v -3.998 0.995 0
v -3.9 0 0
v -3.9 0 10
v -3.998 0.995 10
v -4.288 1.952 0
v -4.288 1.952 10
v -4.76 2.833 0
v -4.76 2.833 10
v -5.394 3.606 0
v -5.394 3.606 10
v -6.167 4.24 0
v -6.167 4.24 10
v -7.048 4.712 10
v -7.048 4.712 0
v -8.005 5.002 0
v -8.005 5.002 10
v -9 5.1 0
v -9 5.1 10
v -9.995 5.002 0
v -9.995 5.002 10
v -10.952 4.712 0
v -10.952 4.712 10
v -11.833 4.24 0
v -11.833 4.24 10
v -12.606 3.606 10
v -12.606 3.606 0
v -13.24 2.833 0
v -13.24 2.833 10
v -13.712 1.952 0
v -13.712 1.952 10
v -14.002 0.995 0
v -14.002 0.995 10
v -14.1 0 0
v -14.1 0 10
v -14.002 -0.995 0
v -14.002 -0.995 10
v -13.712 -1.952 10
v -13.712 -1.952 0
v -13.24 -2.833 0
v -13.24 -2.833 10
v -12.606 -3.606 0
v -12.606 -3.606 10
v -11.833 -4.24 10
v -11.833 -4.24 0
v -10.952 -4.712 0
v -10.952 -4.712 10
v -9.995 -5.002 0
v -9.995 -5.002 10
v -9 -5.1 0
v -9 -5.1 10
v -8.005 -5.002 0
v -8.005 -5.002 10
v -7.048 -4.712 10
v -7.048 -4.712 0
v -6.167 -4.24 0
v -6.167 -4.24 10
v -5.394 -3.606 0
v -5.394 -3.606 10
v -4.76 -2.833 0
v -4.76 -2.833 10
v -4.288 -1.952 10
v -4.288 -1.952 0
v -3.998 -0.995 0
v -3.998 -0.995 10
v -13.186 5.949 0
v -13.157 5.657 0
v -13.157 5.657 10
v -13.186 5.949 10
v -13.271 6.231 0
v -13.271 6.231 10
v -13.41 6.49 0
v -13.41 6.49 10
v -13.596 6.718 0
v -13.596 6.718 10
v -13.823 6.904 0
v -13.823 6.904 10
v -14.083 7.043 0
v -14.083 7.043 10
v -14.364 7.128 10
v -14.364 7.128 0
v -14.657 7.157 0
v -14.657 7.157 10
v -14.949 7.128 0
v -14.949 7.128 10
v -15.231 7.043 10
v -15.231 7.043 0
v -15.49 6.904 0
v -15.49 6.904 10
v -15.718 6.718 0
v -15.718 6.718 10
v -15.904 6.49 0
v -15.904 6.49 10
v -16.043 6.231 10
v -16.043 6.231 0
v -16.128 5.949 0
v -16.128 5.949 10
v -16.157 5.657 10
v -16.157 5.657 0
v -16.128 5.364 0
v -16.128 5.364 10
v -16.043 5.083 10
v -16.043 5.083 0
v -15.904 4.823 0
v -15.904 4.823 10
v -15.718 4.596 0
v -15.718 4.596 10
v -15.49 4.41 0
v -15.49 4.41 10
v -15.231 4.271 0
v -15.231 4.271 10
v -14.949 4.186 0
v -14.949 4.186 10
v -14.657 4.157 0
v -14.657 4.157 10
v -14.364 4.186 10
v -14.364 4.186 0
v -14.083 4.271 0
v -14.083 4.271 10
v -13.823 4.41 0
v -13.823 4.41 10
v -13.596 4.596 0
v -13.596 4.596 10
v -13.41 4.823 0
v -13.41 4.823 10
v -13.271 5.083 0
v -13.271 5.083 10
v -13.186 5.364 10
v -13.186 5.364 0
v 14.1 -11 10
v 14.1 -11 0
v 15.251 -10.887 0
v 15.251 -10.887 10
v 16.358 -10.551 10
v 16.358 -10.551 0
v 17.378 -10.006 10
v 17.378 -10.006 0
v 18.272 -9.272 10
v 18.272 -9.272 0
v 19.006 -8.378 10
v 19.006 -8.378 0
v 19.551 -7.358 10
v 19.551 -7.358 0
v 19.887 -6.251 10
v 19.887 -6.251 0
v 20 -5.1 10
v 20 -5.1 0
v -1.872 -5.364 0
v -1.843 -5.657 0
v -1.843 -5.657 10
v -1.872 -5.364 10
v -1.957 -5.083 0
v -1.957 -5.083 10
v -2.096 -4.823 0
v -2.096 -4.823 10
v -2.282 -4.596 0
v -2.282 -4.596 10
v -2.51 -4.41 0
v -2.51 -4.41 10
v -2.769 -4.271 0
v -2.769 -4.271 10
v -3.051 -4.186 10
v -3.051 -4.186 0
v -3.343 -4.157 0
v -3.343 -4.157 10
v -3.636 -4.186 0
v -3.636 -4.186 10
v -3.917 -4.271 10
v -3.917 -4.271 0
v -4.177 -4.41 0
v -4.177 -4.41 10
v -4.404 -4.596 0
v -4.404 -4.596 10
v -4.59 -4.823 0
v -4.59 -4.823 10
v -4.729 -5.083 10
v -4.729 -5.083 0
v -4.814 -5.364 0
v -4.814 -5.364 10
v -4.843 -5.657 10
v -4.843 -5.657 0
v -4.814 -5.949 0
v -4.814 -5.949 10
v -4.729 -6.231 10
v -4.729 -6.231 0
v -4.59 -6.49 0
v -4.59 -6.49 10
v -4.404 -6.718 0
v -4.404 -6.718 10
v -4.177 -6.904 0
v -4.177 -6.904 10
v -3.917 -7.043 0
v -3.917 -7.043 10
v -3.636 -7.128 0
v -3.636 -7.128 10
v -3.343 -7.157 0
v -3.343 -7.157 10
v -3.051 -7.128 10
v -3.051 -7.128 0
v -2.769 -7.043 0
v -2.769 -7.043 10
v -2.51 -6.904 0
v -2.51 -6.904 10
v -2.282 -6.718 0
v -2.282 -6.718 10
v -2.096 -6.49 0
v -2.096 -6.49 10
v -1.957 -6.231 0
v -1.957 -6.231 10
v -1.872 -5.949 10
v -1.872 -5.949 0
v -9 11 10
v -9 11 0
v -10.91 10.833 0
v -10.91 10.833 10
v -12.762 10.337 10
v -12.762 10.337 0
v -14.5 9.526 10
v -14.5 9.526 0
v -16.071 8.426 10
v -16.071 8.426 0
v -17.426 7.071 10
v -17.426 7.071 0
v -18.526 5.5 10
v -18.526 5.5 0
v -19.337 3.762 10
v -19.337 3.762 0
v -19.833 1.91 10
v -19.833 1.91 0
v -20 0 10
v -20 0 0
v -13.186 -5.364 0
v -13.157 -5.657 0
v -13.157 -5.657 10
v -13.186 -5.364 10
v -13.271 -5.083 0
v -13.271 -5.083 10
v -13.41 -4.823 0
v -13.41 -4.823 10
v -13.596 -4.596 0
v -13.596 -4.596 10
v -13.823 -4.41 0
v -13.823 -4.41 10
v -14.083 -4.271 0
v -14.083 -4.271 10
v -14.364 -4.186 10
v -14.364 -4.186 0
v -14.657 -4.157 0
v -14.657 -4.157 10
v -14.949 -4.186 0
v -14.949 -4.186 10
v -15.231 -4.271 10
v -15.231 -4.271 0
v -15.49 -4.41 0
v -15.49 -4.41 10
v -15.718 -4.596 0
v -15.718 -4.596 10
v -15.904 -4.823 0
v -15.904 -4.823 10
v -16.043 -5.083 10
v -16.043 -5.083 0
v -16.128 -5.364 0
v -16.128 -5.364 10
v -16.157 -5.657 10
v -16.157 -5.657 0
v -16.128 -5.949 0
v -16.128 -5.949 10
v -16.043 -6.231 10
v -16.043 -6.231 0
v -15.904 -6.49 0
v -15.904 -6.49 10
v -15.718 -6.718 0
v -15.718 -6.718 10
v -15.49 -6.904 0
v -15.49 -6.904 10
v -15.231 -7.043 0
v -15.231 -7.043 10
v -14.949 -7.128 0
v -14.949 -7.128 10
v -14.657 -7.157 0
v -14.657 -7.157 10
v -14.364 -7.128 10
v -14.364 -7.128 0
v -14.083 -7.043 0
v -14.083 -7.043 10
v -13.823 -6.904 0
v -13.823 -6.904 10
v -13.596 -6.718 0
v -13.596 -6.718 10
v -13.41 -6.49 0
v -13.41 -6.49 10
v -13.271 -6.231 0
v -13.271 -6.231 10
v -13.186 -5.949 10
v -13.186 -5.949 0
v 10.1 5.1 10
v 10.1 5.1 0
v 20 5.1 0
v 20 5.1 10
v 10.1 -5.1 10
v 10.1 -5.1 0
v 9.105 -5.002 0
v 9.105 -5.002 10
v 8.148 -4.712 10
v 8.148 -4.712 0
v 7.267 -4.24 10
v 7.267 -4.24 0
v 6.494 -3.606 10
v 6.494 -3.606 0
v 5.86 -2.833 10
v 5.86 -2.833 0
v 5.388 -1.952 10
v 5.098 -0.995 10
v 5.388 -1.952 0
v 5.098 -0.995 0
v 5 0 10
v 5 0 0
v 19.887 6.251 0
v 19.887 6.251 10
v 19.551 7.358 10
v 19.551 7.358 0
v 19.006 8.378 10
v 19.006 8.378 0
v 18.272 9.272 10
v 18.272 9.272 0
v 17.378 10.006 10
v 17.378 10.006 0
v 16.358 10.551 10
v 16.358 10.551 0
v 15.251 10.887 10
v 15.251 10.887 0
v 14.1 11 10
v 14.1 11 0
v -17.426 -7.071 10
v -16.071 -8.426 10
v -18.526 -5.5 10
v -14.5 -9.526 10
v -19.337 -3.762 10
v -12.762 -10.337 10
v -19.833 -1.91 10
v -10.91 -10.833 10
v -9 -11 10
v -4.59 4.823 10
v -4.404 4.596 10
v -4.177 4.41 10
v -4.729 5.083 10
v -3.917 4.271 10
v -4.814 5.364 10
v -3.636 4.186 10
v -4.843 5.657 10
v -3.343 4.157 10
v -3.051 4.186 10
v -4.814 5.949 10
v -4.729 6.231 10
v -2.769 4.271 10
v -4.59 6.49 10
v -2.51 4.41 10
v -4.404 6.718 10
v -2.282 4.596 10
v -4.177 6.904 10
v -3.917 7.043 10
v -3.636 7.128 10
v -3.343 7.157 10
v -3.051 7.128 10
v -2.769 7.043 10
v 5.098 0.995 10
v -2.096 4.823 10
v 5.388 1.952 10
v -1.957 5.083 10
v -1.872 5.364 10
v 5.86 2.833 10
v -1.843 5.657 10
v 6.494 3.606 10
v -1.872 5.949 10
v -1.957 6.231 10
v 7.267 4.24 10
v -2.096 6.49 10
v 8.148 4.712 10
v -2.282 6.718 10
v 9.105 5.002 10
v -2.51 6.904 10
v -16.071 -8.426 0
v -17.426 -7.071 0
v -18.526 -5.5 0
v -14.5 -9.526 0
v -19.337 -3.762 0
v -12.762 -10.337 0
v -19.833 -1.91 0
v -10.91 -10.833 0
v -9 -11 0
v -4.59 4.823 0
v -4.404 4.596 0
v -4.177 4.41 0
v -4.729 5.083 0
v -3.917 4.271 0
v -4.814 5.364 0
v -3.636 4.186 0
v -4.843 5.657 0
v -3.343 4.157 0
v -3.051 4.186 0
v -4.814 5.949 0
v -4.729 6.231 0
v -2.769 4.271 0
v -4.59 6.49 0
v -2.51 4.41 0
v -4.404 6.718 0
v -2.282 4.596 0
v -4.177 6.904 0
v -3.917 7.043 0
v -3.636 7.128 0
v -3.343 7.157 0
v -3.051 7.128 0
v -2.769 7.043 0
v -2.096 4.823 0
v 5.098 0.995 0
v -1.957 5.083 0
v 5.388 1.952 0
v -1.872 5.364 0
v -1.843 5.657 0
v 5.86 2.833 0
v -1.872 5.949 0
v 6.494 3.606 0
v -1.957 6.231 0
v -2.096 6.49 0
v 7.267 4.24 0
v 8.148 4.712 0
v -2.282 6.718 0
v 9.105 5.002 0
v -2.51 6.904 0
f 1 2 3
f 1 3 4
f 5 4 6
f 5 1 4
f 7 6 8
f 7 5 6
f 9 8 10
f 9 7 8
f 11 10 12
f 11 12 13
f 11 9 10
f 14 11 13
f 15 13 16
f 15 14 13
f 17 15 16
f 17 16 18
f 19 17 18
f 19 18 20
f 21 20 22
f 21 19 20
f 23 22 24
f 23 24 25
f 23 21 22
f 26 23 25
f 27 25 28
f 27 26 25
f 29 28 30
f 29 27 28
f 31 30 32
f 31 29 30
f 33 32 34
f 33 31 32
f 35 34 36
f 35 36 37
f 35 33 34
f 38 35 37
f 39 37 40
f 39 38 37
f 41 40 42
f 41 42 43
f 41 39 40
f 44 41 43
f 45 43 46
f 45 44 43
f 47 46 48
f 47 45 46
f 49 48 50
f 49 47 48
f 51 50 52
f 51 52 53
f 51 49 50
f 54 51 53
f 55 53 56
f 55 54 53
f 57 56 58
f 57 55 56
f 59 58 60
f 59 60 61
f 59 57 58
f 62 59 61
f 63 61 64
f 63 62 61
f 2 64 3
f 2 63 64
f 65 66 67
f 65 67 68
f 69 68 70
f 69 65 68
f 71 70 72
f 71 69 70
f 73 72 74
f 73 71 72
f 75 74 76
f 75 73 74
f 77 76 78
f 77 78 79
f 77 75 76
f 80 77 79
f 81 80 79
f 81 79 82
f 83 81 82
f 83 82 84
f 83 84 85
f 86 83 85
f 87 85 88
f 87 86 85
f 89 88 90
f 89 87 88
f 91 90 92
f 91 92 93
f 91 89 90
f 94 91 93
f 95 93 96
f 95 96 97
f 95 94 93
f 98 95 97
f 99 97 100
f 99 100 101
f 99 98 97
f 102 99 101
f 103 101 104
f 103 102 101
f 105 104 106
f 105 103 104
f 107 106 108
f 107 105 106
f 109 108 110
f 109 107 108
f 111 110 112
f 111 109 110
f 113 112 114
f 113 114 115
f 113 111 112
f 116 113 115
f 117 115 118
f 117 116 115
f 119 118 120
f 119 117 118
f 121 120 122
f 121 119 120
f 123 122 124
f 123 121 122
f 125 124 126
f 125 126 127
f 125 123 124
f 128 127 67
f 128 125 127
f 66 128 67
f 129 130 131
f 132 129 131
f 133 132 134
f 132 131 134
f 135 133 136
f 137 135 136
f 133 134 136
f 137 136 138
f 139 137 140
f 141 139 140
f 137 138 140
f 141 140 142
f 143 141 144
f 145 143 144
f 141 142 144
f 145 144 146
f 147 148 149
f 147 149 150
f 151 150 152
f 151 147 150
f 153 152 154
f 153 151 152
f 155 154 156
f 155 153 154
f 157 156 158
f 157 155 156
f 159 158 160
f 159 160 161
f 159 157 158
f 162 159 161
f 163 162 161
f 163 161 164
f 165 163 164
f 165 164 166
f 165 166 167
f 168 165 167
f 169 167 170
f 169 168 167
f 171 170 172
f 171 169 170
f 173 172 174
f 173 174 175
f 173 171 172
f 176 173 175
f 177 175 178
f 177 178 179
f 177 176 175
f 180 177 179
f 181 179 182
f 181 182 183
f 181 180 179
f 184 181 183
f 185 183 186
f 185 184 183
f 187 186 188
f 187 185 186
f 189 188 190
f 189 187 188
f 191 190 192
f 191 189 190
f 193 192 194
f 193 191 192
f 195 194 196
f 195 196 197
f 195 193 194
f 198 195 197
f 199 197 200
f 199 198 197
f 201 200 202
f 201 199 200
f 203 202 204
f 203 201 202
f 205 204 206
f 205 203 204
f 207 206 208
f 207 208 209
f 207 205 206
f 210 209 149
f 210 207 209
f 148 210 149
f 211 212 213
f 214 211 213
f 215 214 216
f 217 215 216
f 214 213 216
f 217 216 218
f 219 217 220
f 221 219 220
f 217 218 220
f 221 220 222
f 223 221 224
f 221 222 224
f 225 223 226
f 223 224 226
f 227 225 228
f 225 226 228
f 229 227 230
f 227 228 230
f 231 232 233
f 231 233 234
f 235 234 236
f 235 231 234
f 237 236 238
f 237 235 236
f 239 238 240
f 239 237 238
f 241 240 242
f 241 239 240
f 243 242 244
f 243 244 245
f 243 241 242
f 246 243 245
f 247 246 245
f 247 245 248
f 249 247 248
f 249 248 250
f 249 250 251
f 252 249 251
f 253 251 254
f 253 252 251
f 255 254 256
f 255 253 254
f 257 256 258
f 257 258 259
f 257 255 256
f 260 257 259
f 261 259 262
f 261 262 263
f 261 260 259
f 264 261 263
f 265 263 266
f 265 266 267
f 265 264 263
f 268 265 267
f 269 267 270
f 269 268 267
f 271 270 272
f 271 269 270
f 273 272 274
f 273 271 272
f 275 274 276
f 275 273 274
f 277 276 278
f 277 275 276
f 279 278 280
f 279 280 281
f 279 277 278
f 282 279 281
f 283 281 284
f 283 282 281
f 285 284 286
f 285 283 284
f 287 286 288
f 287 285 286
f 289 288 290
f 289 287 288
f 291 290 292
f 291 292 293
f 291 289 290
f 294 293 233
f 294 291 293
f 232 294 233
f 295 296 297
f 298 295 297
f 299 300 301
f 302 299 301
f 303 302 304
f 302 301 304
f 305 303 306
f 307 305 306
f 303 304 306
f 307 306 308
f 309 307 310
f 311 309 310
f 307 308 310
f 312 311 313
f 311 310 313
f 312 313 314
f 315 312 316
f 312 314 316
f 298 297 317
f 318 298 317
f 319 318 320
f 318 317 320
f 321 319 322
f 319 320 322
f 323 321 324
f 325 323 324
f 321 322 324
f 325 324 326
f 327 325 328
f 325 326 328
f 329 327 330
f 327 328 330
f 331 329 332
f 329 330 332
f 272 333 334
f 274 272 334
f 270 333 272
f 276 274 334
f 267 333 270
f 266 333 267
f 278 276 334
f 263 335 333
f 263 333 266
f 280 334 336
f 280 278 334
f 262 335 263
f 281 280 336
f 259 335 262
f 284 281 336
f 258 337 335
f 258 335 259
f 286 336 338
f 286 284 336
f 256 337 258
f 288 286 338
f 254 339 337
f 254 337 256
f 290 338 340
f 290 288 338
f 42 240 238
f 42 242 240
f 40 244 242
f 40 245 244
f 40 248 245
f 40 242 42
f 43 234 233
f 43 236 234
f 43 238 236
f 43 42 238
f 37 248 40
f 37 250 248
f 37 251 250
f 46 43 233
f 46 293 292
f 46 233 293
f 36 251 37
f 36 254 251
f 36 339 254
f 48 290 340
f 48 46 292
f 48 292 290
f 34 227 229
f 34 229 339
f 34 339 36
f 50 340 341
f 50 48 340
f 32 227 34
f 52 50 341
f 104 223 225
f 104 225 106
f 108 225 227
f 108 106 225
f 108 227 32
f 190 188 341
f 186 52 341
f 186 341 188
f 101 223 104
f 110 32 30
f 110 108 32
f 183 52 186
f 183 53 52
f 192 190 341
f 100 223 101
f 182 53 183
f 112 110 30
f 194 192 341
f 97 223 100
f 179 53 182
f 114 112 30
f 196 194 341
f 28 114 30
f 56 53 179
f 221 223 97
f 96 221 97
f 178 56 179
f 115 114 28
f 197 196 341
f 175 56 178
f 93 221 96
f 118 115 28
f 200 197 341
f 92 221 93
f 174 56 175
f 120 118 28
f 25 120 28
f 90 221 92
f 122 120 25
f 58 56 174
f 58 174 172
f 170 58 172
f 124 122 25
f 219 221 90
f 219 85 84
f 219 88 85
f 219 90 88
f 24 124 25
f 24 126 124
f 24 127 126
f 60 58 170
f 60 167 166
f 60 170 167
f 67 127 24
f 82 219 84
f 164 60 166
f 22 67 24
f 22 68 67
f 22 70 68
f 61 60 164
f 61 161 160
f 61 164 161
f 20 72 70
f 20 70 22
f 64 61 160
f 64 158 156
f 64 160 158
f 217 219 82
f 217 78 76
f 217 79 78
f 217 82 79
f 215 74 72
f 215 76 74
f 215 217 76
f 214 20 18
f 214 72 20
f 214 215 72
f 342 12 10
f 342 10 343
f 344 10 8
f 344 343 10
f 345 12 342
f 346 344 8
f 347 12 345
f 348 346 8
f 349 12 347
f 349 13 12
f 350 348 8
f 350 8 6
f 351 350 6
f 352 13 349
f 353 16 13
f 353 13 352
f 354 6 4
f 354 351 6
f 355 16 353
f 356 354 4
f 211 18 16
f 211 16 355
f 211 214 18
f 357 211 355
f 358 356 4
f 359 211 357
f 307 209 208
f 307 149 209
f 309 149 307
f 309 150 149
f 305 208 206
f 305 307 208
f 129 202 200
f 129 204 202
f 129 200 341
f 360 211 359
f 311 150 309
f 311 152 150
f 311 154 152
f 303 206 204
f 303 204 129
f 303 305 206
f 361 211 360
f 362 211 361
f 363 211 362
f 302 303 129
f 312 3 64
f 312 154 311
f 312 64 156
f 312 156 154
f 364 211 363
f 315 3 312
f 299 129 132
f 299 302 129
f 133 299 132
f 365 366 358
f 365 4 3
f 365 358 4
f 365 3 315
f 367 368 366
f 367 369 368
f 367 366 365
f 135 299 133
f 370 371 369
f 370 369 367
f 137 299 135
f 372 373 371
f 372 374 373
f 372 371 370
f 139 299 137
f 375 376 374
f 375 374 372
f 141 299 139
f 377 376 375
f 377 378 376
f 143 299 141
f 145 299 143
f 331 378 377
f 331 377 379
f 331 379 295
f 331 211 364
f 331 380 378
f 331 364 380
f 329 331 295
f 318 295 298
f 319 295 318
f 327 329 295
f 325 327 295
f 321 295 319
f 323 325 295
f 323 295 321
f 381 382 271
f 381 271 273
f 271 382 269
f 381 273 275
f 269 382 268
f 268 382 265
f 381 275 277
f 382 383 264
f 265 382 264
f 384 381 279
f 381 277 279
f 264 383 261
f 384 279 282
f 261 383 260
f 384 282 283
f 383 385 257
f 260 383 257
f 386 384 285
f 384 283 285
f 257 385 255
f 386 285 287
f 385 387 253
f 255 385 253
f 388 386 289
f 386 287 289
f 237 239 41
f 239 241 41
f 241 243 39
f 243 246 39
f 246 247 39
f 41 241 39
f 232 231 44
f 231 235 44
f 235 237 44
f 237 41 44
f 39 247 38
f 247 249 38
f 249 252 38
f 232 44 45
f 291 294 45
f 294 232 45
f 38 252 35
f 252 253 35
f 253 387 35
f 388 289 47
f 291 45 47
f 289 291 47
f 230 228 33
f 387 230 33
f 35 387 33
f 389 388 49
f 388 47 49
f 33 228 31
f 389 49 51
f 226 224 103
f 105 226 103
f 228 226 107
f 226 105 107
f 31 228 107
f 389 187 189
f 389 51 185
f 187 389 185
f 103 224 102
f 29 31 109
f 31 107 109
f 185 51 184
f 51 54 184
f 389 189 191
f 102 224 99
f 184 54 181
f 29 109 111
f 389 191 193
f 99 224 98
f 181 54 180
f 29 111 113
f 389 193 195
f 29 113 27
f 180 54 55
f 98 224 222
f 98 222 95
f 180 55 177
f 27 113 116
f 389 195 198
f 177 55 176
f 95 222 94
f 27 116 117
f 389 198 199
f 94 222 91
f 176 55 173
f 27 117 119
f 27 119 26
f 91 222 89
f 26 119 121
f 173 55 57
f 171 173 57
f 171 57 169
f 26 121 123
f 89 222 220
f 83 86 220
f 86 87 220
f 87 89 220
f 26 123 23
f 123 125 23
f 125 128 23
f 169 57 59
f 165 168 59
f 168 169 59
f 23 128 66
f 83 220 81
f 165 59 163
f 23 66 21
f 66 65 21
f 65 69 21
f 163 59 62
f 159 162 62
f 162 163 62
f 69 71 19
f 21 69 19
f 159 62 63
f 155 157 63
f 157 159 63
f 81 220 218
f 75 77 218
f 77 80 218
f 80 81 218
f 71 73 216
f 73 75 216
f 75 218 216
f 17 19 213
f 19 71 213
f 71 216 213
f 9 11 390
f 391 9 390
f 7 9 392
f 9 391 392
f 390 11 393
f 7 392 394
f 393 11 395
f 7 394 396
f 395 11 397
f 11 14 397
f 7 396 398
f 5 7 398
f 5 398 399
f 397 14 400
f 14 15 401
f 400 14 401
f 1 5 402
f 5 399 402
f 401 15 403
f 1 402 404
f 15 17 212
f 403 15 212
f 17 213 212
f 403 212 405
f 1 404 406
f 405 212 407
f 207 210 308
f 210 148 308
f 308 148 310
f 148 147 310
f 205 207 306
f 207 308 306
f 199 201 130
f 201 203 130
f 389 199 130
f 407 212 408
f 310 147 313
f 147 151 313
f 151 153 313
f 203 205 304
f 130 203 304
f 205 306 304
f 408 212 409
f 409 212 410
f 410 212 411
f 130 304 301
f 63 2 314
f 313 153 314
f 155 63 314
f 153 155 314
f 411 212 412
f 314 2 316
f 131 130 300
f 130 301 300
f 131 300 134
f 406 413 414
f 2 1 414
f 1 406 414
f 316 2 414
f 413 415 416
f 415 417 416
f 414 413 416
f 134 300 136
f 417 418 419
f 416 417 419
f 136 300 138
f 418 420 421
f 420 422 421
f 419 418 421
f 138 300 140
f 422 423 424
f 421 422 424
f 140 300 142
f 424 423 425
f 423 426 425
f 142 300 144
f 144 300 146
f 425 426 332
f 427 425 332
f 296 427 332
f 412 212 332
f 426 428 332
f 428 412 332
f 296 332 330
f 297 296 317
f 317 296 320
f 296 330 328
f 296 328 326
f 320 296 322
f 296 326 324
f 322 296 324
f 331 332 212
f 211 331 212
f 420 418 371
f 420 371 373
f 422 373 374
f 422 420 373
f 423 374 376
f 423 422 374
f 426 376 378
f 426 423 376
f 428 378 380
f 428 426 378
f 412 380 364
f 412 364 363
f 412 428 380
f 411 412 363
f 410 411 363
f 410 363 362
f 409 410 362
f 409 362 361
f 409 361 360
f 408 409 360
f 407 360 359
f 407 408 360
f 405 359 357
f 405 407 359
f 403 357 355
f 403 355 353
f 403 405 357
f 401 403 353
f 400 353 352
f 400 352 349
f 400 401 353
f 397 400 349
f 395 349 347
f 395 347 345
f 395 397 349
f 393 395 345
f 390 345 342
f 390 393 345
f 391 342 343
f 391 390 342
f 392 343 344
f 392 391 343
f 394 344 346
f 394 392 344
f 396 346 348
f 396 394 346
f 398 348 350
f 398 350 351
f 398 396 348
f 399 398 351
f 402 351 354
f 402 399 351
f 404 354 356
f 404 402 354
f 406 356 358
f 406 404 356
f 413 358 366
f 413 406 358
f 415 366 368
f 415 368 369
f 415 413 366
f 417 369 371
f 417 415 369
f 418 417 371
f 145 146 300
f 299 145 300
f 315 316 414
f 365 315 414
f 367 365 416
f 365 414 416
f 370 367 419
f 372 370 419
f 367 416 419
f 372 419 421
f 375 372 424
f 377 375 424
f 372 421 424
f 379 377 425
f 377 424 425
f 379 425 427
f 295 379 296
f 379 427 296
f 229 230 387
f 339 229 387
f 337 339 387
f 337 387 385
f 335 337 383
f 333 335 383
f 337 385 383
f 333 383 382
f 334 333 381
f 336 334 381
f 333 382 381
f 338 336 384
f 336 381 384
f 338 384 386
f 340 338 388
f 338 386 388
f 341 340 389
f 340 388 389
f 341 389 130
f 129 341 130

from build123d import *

# Parameters (mm, degrees)
F0_R     = 1.5
F0_R_2   = 5.1
F1_DEPTH = 10


with BuildPart() as f1:
    # F0 (on Top) → F1 (new body)
    with BuildSketch(Plane.XY):
        with BuildLine():
            ThreePointArc((20, 5.1), (18.27193, 9.27193), (14.1, 11))
            Line((14.1, 11), (-9, 11))
            ThreePointArc((-9, 11), (-16.778175, 7.778175), (-20, 0))
            ThreePointArc((-20, 0), (-16.778175, -7.778175), (-9, -11))
            Line((-9, -11), (14.1, -11))
            ThreePointArc((14.1, -11), (18.27193, -9.27193), (20, -5.1))
            Line((20, -5.1), (10.1, -5.1))
            ThreePointArc((10.1, -5.1), (6.493755, -3.606245), (5, 0))
            ThreePointArc((5, 0), (6.493755, 3.606245), (10.1, 5.1))
            Line((10.1, 5.1), (20, 5.1))
        make_face()
        with Locations((-14.656854, -5.656854)):
            Circle(F0_R, mode=Mode.SUBTRACT)
        with Locations((-3.343146, -5.656854)):
            Circle(F0_R, mode=Mode.SUBTRACT)
        with Locations((-9, 0)):
            Circle(F0_R_2, mode=Mode.SUBTRACT)
        with Locations((-14.656854, 5.656854)):
            Circle(F0_R, mode=Mode.SUBTRACT)
        with Locations((-3.343146, 5.656854)):
            Circle(F0_R, mode=Mode.SUBTRACT)
    extrude(amount=F1_DEPTH)


solid = f1.part
